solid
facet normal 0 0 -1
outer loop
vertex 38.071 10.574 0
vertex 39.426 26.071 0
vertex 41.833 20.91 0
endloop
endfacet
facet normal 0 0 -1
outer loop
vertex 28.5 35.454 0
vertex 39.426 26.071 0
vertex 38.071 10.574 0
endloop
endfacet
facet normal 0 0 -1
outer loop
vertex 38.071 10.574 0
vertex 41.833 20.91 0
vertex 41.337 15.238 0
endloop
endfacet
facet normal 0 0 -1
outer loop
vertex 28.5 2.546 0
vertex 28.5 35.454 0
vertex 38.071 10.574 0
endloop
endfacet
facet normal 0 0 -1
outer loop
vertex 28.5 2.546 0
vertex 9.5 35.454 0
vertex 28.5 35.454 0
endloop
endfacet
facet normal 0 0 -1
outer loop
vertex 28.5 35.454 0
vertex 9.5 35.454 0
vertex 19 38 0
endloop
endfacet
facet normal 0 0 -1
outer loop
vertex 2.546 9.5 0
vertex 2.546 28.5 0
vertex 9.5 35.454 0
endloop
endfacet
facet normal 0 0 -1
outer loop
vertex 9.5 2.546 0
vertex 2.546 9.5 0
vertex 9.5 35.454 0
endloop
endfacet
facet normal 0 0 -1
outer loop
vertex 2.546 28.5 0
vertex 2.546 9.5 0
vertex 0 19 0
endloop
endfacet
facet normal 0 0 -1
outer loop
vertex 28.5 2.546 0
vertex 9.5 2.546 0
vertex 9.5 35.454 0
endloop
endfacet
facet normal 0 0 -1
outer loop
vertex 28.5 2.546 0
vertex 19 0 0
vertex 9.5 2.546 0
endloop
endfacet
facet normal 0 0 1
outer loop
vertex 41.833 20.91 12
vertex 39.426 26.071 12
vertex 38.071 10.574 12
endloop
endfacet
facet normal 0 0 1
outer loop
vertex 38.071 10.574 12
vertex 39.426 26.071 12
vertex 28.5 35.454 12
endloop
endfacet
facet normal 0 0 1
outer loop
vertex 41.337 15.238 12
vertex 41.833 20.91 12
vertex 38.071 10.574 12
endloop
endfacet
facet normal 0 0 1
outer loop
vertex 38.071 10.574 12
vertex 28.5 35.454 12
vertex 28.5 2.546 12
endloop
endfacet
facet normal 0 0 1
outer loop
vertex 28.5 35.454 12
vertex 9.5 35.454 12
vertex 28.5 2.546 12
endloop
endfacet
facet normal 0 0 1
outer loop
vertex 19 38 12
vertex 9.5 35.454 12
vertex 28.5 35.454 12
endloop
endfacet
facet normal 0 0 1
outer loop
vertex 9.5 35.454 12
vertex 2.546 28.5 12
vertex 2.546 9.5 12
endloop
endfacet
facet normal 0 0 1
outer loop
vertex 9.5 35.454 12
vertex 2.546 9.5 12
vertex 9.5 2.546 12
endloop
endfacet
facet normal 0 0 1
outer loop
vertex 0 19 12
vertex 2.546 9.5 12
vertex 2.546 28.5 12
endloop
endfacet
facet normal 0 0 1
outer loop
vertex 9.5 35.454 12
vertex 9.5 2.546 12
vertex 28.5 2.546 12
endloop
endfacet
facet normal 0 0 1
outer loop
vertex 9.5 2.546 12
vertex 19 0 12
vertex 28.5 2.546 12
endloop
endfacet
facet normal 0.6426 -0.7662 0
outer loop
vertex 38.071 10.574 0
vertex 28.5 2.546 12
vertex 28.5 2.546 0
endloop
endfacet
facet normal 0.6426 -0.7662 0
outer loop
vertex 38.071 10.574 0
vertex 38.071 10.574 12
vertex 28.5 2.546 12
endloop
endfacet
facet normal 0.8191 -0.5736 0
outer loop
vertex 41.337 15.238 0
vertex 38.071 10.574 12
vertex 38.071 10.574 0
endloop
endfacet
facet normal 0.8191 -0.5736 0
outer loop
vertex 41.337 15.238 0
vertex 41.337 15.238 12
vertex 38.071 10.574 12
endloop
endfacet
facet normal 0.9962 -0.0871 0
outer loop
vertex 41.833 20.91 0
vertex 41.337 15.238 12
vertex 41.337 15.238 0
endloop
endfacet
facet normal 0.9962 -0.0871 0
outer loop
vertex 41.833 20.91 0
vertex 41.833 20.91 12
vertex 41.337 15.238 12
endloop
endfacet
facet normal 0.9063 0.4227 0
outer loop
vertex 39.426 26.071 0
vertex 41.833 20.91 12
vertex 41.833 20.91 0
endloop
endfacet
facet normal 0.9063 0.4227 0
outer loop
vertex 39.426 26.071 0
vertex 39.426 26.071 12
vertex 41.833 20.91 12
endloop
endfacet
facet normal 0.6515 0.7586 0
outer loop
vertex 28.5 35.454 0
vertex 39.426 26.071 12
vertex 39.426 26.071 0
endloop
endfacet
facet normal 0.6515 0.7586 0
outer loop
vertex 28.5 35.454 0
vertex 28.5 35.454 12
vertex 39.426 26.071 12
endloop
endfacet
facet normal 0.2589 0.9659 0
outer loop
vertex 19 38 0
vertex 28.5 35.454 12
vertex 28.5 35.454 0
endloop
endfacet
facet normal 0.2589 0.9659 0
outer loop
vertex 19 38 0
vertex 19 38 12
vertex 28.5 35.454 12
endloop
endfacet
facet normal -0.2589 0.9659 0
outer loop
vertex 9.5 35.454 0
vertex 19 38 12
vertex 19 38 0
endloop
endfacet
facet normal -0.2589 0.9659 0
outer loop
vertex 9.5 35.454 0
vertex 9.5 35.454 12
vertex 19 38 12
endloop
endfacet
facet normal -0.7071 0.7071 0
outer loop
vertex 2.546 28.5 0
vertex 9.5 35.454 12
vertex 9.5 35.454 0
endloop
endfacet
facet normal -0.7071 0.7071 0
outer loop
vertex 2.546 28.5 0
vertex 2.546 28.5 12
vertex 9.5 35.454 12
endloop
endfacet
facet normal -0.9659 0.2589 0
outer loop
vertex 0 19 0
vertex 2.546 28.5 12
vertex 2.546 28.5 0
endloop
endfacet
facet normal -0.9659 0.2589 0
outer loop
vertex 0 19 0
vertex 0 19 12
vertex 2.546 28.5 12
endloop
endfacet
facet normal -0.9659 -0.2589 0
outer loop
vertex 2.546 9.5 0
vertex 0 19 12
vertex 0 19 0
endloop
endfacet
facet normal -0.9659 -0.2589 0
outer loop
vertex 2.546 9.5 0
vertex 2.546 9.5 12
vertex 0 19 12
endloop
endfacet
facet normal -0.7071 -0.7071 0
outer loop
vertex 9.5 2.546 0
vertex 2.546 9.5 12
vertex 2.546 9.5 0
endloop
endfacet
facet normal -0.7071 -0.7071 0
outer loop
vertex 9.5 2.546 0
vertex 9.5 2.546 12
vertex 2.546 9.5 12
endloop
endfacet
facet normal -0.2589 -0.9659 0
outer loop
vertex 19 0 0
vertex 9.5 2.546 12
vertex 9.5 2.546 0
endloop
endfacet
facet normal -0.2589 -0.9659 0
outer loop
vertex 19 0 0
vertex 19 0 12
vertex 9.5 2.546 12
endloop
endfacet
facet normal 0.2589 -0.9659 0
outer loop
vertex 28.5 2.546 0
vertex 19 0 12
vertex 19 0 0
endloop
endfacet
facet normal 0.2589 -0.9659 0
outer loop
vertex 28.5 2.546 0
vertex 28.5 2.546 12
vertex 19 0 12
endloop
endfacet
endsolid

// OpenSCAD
$fn = 32;

// ----------------------------------------------------------------------
// Eccentric disc: step, 12 mm thick
// ----------------------------------------------------------------------

// --- parameters (mm) ---
profile_height = 12;      // extrusion height
profile_points = 13;      // points of the closed outline

profile = [[0, 19], [2.546, 9.5], [9.5, 2.546], [19, 0], [28.5, 2.546], [38.071, 10.574], [41.337, 15.238], [41.833, 20.91], [39.426, 26.071], [28.5, 35.454], [19, 38], [9.5, 35.454], [2.546, 28.5]];  // single closed polygon, 13 points, counter clockwise

// --- the one profile operation ---
linear_extrude(height = profile_height) polygon(points = profile);
